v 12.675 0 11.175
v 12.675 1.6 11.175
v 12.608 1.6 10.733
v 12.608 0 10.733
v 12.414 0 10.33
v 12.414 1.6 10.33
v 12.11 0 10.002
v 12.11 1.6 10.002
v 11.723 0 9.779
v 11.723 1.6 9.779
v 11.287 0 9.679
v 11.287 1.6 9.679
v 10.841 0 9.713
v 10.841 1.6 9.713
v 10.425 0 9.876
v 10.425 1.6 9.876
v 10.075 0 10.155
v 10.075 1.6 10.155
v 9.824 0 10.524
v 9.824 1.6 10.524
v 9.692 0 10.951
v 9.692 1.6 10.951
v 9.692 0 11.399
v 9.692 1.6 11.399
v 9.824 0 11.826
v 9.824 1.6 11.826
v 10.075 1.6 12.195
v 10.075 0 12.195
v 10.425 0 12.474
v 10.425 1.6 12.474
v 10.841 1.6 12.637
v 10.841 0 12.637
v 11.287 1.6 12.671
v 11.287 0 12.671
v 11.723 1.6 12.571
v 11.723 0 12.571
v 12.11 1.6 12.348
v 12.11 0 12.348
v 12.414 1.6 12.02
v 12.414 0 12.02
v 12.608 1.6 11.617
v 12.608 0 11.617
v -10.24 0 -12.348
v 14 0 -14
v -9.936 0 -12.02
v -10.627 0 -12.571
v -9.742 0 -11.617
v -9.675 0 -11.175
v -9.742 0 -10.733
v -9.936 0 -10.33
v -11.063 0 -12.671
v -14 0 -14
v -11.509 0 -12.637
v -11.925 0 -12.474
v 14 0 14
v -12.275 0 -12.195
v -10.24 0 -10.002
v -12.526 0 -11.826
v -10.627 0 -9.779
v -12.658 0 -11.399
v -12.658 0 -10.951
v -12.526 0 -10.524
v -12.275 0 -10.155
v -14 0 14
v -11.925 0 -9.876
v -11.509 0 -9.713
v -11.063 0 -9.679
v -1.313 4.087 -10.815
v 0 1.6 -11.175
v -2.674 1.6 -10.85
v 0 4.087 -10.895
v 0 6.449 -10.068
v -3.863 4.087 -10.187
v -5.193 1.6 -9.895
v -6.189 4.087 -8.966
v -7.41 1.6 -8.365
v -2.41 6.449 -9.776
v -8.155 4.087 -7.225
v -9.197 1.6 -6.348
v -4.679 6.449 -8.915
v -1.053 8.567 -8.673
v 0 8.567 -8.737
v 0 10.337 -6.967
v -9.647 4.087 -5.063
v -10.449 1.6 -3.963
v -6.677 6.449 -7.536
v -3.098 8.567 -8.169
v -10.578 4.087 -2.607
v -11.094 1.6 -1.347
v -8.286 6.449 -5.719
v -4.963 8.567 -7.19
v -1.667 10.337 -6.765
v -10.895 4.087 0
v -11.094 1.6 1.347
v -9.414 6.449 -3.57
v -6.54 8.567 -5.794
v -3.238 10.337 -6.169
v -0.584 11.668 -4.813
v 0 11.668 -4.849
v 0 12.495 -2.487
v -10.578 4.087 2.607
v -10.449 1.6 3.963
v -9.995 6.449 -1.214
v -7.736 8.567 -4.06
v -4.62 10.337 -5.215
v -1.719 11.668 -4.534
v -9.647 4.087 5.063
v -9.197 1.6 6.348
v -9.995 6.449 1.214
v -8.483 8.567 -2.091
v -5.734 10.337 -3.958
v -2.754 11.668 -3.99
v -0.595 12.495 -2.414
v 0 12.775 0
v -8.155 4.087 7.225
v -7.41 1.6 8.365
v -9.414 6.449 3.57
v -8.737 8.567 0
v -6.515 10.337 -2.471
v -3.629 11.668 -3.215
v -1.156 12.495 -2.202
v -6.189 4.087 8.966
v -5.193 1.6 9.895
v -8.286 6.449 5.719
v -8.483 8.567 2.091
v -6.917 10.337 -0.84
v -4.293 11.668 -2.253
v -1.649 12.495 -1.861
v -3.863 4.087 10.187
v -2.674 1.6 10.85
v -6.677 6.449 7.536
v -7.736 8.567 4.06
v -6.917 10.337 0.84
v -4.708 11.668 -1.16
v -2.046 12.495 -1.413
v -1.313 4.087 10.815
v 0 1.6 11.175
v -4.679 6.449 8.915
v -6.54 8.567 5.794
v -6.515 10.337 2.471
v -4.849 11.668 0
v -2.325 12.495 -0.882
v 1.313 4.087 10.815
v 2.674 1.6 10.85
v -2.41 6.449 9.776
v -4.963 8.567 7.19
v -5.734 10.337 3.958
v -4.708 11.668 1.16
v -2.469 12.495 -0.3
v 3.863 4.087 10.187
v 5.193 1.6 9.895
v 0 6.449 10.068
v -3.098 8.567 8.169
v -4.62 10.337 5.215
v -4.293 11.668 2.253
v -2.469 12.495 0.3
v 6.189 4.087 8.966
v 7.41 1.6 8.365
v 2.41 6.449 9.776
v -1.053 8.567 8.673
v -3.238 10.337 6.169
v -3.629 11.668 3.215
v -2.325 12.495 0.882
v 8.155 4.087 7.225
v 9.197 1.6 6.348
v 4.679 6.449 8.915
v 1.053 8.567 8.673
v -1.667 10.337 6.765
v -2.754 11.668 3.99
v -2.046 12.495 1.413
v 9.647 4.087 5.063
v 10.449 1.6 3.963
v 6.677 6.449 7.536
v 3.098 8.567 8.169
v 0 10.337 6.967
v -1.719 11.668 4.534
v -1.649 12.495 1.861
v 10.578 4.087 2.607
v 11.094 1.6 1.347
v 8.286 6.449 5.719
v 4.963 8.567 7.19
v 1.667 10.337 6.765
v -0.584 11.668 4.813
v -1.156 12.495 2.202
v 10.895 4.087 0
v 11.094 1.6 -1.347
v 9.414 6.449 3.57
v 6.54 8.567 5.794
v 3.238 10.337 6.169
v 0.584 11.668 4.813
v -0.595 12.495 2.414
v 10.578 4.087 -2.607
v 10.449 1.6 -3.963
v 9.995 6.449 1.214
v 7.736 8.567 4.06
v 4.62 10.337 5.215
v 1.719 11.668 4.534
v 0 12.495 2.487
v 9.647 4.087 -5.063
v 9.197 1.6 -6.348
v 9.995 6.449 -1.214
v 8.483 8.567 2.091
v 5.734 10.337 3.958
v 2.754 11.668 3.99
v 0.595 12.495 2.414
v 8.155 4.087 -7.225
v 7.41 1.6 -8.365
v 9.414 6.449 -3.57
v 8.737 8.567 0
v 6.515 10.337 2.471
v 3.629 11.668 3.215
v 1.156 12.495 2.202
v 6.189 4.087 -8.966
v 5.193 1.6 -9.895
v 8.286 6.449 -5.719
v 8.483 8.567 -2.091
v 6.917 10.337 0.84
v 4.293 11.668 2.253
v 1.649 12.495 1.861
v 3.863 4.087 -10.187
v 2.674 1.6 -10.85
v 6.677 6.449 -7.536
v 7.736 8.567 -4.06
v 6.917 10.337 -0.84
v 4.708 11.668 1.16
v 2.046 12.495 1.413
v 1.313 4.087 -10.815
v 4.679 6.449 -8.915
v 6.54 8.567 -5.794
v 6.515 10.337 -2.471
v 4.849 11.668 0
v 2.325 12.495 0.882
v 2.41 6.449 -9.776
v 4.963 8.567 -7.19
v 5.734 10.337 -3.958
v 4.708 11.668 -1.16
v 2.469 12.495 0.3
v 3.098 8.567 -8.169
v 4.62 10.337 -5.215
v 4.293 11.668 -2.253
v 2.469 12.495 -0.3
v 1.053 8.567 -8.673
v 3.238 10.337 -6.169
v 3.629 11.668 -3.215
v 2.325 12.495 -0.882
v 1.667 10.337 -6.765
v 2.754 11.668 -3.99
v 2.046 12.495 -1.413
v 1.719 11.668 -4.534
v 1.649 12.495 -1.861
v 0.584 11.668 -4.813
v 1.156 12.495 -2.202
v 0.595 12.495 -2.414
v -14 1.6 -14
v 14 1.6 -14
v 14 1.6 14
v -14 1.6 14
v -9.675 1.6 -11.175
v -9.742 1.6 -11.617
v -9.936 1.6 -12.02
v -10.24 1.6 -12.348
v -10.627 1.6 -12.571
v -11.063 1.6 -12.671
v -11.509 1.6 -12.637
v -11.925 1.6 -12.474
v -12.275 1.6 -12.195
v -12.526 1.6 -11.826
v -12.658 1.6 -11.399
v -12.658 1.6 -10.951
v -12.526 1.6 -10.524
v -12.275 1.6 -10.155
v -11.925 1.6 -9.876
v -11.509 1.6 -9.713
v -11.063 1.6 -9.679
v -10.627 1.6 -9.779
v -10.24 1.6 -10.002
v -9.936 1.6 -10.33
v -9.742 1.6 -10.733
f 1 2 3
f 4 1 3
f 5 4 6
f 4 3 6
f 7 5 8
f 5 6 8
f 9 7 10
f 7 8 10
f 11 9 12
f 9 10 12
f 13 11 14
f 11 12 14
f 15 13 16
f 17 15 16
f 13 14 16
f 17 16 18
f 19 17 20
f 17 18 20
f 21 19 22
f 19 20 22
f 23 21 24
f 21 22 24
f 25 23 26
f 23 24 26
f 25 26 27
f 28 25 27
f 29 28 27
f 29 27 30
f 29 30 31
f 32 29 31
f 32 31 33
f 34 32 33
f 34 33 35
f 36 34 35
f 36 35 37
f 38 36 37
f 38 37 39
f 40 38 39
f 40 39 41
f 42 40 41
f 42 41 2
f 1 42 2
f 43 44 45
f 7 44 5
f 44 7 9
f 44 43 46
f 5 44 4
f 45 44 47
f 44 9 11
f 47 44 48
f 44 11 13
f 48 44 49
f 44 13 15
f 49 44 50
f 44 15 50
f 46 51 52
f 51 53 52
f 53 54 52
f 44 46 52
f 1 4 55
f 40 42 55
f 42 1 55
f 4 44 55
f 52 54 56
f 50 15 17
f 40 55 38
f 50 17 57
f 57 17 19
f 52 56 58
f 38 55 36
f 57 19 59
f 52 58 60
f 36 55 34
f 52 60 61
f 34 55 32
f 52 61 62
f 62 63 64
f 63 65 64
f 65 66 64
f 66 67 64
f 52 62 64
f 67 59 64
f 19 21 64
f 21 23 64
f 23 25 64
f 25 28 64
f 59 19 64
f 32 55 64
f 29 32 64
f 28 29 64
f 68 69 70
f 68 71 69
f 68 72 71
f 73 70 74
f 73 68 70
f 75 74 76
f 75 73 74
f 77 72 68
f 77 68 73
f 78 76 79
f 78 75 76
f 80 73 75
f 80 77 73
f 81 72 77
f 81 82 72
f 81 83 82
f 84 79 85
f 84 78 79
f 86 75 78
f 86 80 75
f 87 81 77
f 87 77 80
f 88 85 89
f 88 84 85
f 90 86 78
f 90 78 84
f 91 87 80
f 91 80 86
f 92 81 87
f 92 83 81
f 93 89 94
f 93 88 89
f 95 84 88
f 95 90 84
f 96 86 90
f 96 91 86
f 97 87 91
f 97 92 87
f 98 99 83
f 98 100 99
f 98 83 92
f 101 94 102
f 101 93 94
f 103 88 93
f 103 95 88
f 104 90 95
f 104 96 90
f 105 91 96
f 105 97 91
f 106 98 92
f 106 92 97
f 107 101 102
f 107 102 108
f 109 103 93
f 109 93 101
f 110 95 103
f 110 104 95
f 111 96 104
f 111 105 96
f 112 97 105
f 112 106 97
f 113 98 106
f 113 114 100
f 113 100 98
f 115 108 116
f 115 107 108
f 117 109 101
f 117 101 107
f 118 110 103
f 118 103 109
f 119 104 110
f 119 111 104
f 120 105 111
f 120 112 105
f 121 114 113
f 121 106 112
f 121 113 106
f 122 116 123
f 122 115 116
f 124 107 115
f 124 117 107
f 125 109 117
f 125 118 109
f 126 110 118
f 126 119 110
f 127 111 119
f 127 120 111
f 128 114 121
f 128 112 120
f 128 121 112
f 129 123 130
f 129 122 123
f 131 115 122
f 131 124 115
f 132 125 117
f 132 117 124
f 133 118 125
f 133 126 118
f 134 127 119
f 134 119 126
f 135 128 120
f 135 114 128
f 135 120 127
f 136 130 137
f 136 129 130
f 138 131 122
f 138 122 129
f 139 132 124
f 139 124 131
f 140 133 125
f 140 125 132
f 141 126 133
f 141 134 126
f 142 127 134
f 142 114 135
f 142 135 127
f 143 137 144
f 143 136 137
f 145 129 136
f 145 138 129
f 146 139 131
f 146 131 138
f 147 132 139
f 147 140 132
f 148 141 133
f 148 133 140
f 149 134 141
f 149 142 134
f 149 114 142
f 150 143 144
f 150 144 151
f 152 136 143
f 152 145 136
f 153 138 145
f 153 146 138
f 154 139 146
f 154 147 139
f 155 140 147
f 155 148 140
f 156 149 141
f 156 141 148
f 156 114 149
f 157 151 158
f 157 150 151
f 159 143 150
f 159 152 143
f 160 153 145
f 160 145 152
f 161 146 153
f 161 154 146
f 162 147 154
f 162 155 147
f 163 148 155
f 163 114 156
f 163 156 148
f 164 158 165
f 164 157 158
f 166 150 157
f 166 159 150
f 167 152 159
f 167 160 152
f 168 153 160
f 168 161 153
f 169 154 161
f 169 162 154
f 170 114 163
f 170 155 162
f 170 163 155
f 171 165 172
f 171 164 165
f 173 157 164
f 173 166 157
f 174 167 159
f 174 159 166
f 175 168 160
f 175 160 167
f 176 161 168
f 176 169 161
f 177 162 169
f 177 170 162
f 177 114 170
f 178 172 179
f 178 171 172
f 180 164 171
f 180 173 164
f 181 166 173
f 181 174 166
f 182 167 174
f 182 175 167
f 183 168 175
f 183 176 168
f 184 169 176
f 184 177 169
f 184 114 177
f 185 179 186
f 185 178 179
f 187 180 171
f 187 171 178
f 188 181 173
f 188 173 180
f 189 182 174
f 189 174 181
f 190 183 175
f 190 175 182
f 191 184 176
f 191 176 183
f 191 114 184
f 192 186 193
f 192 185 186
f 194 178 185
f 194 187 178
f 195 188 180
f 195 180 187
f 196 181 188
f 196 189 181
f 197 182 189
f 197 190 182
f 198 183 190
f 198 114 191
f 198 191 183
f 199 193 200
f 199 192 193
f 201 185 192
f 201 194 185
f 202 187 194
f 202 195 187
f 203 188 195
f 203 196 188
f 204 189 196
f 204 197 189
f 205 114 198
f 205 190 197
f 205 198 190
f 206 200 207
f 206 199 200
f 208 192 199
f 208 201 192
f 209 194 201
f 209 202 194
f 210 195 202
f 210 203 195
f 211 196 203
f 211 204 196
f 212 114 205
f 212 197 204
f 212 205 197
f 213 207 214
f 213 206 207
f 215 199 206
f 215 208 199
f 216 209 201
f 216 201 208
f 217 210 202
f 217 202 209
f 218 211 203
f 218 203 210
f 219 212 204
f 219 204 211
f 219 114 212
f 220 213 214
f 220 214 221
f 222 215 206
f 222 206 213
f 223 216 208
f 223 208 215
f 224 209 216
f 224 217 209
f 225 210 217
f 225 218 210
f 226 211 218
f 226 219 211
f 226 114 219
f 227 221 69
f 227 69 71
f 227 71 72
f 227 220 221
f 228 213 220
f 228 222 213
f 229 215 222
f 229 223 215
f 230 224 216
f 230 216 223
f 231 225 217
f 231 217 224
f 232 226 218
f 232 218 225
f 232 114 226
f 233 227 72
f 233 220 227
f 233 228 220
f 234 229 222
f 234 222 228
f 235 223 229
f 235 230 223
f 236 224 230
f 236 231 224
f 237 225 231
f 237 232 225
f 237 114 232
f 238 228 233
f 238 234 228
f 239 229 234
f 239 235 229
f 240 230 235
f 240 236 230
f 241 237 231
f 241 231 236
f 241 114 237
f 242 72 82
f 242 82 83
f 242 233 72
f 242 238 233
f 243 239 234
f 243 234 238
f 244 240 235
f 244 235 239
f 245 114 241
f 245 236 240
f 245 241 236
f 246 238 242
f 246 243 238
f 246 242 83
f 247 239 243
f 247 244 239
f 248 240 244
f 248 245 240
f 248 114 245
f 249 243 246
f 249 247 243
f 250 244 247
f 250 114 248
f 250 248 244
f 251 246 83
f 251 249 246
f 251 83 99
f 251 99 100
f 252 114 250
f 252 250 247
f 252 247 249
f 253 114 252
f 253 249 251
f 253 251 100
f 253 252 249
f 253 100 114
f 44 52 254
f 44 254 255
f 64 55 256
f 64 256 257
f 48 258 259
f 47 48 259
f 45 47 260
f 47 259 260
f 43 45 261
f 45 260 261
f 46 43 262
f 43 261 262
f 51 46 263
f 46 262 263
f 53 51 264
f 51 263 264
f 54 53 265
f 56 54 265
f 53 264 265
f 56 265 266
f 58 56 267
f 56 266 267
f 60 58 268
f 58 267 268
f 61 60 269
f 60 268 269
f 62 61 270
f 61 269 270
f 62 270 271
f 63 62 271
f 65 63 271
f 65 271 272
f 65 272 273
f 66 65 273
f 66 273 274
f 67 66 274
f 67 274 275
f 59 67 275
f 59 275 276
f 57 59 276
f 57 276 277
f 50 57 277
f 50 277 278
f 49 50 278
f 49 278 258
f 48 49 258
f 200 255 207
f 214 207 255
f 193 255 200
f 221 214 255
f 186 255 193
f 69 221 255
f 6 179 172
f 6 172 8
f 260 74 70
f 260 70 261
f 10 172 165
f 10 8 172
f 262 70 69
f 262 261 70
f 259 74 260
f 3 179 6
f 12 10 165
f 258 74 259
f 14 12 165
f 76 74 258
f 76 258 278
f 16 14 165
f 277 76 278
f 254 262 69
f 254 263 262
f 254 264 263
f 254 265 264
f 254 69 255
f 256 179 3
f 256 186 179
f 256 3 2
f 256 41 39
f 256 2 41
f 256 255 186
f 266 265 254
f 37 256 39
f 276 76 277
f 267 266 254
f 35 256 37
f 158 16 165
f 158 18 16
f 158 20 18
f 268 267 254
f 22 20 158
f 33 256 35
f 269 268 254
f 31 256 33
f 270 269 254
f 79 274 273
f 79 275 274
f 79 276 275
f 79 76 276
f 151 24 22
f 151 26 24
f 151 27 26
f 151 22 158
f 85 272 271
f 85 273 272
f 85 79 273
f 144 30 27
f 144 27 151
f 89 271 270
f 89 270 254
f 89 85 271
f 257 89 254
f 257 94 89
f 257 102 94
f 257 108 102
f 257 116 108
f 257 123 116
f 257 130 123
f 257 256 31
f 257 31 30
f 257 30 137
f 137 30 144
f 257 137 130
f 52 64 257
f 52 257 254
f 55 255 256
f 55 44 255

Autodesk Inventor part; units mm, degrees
ref_plane "YZ Plane" through (0, 0, 0) normal (1, 0, 0) x (0, 1, 0)
ref_plane "XZ Plane" through (0, 0, 0) normal (0, 1, 0) x (-1, 0, 0)
ref_plane "XY Plane" through (0, 0, 0) normal (0, 0, 1) x (1, 0, 0)
sketch "草圖1" plane through (0, 0, 0) normal (0, 1, 0) x (-1, 0, 0)
  line L0 (-14, 14) -> (14, 14)
  line L1 (14, 14) -> (14, -14)
  line L2 (14, -14) -> (-14, -14)
  line L3 (-14, -14) -> (-14, 14)
  line L4 (-14, 14) -> (14, -14) construction
  line L5 (14, 14) -> (-14, -14) construction
  point P0 (0, 0)
  dimension "d0" = 28
  dimension "d1" = 28
extrude "擠出1" add sketch "草圖1" along normal blind 1.6
sketch "草圖2" plane through (0, 0, 0) normal (1, 0, 0) x (0, 1, 0)
  line L0 (1.6, 14) -> (1.6, -14) projected
  circle A0 centre (1.6, 0) radius 11.175
  line L1 (12.775, 0) -> (1.6, 0)
  line L2 (-14.045, 0) -> (17.245, 0) projected
  point P0 (0, 0)
  point P1 (1.6, -11.175)
  dimension "d4" = 22.35
revolve "迴轉1" add sketch "草圖2" angle 360 about axis through (0, -10, 0) along (0, 1, 0) picked at (4.0451, -6.9877) contours L1 A0 L0
sketch "草圖3" plane through (0, 1.6, 0) normal (0, 1, 0) x (1, 0, 0)
  circle A0 centre (0, 0) radius 11.175 projected
  line L0 (14, 14) -> (-14, 14) projected
  line L1 (-14, 14) -> (-14, -14) projected
  line L2 (-14, -14) -> (14, -14) projected
  line L3 (14, -14) -> (14, 14) projected
  line L4 (11.175, -11.175) -> (-11.175, -11.175) construction
  line L5 (-11.175, -11.175) -> (-11.175, 11.175) construction
  line L6 (-11.175, 11.175) -> (11.175, 11.175) construction
  line L7 (11.175, 11.175) -> (11.175, -11.175) construction
  line L8 (11.175, -11.175) -> (-11.175, 11.175) construction
  line L9 (-11.175, -11.175) -> (11.175, 11.175) construction
  circle A1 centre (-11.175, 11.175) radius 1.5
  circle A2 centre (11.175, -11.175) radius 1.5
  dimension "d6" = 3
  dimension "d7" = 3
extrude "擠出2" cut sketch "草圖3" against normal blind 1.6 contours A1 | A2
properties part number "50w led"
